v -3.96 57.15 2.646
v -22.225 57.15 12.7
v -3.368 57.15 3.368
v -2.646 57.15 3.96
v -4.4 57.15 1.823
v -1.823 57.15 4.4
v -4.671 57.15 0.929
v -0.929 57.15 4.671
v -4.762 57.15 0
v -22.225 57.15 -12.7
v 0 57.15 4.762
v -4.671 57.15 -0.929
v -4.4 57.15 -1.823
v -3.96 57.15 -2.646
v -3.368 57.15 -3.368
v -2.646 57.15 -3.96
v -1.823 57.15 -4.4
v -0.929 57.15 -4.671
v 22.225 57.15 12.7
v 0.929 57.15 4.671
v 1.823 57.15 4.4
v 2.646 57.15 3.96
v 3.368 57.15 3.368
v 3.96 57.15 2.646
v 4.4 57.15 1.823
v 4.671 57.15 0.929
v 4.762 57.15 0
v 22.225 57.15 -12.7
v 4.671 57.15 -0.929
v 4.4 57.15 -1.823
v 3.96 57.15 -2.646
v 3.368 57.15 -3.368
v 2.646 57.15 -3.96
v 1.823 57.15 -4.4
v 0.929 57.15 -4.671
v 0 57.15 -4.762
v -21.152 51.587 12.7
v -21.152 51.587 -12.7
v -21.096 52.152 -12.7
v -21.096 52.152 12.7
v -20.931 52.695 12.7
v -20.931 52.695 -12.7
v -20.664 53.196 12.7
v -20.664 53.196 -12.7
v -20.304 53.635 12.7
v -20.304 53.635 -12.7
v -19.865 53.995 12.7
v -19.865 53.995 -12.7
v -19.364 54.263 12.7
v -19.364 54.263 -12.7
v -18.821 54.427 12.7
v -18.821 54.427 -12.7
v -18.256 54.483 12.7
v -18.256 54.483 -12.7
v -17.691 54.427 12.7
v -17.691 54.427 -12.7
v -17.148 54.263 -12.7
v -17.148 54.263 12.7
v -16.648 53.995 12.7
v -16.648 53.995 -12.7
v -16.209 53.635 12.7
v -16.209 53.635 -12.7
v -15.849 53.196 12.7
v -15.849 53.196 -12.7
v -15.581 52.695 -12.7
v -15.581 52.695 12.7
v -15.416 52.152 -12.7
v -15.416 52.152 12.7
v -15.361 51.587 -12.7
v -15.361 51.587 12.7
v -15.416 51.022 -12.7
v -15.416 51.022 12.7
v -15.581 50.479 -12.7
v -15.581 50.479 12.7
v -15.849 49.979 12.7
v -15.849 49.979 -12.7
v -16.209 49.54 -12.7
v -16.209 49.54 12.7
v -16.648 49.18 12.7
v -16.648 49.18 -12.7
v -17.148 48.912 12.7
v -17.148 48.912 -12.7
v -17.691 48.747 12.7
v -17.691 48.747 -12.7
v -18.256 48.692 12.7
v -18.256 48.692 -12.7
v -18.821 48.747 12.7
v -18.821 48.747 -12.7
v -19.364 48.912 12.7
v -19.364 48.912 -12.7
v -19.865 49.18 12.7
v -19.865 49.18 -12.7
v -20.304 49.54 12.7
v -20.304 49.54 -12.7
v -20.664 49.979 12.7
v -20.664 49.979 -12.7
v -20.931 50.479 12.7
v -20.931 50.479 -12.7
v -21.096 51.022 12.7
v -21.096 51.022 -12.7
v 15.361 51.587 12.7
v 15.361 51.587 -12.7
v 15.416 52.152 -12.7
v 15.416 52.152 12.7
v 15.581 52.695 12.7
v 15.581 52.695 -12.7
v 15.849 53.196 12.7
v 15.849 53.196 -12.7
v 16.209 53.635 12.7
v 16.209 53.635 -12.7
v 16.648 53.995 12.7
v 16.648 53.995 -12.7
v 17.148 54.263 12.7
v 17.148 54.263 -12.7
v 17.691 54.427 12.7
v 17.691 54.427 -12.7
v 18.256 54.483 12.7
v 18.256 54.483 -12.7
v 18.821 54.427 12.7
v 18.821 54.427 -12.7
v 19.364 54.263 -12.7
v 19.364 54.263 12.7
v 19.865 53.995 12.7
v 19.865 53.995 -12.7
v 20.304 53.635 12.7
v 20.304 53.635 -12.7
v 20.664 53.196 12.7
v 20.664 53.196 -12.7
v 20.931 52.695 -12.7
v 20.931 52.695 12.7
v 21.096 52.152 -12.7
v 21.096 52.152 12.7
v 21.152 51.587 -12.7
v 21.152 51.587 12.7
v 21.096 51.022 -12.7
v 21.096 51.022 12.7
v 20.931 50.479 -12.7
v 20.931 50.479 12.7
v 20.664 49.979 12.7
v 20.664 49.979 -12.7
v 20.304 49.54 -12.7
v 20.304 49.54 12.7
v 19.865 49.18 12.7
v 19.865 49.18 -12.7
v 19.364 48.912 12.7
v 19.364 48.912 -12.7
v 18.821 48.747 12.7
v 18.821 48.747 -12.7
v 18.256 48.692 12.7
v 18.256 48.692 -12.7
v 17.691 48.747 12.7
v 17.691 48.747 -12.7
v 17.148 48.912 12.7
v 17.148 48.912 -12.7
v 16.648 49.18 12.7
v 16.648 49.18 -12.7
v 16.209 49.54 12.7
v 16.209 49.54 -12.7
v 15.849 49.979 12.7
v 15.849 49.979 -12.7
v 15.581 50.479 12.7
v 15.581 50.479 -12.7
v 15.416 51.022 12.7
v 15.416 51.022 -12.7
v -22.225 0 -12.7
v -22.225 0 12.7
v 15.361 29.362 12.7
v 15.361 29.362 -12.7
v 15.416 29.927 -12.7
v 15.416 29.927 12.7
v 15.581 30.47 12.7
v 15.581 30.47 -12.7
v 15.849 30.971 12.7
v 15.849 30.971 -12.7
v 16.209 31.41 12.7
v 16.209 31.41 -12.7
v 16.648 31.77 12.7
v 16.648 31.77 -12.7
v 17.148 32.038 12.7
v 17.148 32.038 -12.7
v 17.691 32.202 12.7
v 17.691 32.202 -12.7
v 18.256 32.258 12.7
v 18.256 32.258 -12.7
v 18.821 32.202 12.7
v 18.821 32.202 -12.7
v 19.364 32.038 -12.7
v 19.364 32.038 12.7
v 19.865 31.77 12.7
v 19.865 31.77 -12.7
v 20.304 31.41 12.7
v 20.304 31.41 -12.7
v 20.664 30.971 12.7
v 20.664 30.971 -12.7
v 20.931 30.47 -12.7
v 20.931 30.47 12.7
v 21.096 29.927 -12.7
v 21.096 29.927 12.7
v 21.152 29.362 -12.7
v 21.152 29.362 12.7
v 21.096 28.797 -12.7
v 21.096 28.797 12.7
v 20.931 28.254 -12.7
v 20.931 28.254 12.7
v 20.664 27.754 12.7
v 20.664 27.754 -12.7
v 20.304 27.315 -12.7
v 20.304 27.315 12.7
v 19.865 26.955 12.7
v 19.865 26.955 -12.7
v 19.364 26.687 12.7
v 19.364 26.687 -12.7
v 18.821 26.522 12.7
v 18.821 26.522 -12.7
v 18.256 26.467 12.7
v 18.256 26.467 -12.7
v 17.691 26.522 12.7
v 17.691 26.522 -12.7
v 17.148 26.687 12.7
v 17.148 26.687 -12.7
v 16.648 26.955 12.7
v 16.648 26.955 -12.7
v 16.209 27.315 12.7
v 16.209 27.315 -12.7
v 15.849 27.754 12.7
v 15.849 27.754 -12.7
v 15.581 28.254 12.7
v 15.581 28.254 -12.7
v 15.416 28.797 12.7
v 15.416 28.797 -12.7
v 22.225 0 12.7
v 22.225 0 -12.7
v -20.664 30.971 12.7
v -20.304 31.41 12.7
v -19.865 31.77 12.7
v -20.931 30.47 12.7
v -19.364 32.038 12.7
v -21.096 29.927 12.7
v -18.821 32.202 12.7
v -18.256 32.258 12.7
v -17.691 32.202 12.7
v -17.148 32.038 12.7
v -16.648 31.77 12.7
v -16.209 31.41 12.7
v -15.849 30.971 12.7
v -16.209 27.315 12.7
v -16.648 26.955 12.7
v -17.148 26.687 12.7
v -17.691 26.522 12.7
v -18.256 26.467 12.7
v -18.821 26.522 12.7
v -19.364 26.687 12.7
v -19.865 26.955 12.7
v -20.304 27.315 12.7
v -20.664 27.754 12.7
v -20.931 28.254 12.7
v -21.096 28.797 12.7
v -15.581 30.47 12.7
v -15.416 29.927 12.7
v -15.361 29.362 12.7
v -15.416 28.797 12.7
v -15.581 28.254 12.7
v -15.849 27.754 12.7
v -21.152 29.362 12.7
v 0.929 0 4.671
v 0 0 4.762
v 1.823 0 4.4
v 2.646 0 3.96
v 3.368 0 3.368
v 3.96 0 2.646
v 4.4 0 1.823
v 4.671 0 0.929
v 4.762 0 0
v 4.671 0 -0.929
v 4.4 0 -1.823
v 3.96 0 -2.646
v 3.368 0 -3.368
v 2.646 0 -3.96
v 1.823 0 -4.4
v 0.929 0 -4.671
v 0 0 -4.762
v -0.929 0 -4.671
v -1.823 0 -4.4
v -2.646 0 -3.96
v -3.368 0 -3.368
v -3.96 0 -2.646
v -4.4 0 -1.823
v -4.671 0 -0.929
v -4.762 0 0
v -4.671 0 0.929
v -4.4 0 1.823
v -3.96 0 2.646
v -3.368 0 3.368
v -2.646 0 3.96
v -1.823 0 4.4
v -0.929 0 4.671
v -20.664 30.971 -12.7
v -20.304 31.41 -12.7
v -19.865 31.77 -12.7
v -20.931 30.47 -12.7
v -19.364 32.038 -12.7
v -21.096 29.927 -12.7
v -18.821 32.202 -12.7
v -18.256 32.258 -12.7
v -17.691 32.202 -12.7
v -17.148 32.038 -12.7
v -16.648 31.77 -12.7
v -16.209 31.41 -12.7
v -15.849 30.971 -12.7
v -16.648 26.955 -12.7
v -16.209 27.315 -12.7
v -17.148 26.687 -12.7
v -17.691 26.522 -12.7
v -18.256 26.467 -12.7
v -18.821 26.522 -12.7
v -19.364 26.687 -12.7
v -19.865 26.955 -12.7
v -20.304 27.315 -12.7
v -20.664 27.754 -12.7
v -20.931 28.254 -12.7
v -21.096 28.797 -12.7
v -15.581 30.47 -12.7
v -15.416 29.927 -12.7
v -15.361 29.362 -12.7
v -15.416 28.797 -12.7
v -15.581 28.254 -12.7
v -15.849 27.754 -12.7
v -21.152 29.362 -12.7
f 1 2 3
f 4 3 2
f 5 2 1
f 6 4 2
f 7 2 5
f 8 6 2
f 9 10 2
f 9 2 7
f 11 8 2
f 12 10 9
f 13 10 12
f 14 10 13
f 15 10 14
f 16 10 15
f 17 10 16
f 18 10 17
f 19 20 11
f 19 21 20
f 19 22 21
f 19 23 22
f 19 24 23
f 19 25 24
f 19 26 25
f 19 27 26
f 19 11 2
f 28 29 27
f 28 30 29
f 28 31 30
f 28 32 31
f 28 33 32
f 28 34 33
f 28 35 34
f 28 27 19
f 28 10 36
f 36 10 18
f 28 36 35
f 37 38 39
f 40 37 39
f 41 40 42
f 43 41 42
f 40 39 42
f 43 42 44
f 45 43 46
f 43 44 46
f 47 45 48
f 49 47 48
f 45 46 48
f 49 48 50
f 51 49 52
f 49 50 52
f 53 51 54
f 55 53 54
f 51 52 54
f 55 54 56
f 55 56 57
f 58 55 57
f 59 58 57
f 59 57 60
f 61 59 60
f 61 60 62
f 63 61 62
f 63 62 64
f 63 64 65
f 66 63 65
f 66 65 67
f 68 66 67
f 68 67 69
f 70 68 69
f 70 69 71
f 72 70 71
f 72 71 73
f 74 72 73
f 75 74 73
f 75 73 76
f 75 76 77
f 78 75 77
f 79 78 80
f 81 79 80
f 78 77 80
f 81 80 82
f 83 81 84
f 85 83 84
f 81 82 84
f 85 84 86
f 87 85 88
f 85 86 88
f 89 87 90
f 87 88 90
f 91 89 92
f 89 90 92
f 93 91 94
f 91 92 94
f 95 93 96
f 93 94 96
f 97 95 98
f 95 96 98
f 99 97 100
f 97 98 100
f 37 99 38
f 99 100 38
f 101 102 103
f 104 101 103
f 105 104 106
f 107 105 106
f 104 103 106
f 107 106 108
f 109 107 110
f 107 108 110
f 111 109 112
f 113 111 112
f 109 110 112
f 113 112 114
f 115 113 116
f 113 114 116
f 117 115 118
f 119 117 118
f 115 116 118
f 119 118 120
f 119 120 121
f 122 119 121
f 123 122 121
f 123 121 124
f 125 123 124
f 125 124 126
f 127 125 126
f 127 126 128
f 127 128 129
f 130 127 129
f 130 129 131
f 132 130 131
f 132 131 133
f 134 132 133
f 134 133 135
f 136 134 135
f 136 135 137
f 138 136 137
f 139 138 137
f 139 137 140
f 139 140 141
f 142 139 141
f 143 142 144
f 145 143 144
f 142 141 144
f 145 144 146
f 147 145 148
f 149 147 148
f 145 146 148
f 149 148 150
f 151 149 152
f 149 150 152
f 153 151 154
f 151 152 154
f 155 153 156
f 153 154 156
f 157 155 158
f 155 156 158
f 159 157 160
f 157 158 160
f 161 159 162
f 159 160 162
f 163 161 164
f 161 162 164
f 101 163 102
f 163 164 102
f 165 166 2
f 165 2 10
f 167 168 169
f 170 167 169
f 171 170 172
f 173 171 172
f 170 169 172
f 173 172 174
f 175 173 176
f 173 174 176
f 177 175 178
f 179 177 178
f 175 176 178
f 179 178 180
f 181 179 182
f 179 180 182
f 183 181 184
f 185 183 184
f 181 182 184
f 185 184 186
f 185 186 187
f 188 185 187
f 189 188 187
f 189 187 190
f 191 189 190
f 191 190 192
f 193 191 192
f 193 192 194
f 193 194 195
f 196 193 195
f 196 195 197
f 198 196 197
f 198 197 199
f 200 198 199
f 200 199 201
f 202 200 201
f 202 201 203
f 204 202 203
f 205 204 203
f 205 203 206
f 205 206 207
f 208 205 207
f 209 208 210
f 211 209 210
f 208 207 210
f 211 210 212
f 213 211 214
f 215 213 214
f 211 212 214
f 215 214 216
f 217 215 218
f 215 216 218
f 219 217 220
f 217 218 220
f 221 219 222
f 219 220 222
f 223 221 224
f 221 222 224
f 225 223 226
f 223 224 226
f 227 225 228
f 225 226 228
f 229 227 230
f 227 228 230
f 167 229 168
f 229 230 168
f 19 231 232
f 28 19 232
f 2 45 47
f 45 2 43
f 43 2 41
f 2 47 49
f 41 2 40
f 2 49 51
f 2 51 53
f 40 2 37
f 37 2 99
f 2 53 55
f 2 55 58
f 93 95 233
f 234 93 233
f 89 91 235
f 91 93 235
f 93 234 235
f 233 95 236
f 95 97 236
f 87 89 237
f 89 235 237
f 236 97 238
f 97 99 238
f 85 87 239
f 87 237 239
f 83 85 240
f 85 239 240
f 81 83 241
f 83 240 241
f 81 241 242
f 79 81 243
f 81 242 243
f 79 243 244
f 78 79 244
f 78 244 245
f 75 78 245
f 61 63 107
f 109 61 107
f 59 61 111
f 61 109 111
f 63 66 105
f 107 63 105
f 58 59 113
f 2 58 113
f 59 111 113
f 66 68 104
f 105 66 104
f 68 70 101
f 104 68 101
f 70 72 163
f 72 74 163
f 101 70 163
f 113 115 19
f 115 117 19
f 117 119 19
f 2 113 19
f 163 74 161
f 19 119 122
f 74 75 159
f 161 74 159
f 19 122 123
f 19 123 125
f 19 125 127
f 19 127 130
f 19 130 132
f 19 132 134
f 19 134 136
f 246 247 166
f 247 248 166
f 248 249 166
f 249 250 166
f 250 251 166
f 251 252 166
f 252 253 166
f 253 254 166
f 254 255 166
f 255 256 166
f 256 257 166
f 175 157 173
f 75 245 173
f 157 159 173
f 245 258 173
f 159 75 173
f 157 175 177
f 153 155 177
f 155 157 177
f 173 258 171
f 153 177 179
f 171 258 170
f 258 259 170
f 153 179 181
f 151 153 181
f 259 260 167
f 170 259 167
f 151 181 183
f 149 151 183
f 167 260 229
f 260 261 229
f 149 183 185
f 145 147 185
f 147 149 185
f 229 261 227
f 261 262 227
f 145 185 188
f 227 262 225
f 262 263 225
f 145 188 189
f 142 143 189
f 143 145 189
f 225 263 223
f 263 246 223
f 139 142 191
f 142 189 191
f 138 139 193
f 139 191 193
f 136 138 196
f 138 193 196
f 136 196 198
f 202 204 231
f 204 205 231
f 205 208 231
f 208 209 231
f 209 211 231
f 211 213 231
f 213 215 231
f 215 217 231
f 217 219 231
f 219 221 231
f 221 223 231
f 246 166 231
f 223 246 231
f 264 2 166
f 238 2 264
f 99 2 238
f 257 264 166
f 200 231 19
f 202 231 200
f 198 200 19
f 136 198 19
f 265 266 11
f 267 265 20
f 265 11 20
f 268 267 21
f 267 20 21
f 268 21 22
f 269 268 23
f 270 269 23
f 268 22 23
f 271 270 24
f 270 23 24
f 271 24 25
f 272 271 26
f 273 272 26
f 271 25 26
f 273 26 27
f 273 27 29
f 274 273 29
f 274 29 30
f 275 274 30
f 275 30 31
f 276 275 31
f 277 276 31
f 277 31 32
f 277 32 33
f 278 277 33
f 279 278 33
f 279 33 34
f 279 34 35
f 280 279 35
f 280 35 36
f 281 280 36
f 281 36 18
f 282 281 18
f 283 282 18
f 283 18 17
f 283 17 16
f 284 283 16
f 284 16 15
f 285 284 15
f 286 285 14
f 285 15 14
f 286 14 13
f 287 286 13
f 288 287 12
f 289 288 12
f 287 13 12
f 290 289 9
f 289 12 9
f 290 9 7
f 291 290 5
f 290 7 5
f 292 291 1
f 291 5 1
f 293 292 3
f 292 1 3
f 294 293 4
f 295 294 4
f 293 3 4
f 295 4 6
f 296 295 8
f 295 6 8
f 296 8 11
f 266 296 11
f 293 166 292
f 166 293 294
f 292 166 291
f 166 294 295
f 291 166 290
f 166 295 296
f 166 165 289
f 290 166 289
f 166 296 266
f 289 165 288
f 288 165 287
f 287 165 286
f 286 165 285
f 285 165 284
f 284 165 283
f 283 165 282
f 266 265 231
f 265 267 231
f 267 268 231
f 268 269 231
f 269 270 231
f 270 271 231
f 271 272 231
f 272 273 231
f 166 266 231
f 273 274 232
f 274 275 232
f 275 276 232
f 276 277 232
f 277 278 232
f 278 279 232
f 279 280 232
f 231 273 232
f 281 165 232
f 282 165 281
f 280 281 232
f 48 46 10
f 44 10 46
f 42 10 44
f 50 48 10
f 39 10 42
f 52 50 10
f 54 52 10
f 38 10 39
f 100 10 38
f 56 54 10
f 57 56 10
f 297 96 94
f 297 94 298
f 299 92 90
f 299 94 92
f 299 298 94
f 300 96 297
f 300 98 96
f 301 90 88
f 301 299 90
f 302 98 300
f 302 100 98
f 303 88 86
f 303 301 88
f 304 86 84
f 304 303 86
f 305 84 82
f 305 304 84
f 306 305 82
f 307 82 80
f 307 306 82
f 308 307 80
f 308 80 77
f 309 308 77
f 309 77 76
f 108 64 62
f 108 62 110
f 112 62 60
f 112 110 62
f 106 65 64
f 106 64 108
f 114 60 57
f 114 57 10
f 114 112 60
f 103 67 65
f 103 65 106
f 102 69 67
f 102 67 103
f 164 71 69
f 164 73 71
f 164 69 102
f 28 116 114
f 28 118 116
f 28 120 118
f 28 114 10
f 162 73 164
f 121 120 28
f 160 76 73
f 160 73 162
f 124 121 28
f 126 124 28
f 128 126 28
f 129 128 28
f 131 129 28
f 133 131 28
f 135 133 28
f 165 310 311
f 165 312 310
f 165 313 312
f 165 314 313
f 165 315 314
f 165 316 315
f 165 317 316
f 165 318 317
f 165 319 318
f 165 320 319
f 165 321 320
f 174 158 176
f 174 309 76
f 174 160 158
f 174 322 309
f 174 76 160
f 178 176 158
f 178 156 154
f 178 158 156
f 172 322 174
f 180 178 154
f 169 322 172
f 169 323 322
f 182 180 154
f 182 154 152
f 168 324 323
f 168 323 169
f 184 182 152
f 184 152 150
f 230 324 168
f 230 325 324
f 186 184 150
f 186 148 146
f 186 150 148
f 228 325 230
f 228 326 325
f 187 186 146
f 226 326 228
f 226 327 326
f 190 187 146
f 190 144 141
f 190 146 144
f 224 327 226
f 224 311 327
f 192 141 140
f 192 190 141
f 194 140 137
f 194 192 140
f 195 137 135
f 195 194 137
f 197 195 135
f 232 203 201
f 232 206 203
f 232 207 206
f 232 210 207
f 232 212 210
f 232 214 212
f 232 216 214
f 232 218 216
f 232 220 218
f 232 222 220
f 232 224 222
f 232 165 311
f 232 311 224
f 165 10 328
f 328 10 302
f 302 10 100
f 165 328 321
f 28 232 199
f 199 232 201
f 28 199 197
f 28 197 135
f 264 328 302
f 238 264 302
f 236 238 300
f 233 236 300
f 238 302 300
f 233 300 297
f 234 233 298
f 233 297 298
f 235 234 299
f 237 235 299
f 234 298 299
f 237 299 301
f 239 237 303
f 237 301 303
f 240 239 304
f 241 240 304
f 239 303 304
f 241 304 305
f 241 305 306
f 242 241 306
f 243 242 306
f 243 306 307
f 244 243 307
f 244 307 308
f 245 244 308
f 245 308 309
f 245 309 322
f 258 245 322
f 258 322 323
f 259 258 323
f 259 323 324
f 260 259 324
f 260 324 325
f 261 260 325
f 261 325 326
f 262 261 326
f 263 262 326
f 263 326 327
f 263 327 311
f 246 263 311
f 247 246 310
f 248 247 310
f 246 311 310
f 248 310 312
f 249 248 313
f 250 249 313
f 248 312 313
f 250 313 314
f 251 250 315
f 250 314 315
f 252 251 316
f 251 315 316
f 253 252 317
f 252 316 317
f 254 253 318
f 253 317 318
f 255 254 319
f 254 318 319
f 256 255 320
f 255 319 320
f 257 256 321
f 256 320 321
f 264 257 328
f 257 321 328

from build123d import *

# Parameters (mm, degrees)
SKETCH1_W              = 44.45
SKETCH1_H              = 25.4
BOSS_EXTRUDE1_DEPTH    = 57.15
CUT_EXTRUDE1_REACH     = 64.621
SKETCH2_R              = 4.7625
F_12_CLEARANCE_HOLE1_D = 5.7912


with BuildPart() as part:
    # Sketch1 → Boss-Extrude1 (new body)
    with BuildSketch(Plane(origin=(0, 0, 0), x_dir=(1, 0, 0), z_dir=(0, 1, 0))):
        Rectangle(SKETCH1_W, SKETCH1_H)
    extrude(amount=BOSS_EXTRUDE1_DEPTH)

    # Sketch2 → Cut-Extrude1 (cut, up to next)
    with BuildSketch(Plane(origin=(0, 57.15, 0), x_dir=(1, 0, 0), z_dir=(0, 1, 0)), mode=Mode.PRIVATE) as cut_extrude1_sk1:
        with Locations(Location((0, 0, 0), (0, 0, 270))):
            Circle(SKETCH2_R)
    cut_extrude1_tool1 = extrude(cut_extrude1_sk1.sketch, amount=-CUT_EXTRUDE1_REACH, mode=Mode.PRIVATE) & part.part
    add(cut_extrude1_tool1.solids().sort_by_distance((0, 57.15, 0))[0], mode=Mode.SUBTRACT)

    # #12 Clearance Hole1 (through all)
    with Locations(Plane.XY.offset(12.7)):
        with Locations((-18.25625, 51.5874), (18.25625, 29.3624), (-18.25625, 29.3624), (18.25625, 51.5874)):
            Hole(F_12_CLEARANCE_HOLE1_D / 2)


solid = part.part
